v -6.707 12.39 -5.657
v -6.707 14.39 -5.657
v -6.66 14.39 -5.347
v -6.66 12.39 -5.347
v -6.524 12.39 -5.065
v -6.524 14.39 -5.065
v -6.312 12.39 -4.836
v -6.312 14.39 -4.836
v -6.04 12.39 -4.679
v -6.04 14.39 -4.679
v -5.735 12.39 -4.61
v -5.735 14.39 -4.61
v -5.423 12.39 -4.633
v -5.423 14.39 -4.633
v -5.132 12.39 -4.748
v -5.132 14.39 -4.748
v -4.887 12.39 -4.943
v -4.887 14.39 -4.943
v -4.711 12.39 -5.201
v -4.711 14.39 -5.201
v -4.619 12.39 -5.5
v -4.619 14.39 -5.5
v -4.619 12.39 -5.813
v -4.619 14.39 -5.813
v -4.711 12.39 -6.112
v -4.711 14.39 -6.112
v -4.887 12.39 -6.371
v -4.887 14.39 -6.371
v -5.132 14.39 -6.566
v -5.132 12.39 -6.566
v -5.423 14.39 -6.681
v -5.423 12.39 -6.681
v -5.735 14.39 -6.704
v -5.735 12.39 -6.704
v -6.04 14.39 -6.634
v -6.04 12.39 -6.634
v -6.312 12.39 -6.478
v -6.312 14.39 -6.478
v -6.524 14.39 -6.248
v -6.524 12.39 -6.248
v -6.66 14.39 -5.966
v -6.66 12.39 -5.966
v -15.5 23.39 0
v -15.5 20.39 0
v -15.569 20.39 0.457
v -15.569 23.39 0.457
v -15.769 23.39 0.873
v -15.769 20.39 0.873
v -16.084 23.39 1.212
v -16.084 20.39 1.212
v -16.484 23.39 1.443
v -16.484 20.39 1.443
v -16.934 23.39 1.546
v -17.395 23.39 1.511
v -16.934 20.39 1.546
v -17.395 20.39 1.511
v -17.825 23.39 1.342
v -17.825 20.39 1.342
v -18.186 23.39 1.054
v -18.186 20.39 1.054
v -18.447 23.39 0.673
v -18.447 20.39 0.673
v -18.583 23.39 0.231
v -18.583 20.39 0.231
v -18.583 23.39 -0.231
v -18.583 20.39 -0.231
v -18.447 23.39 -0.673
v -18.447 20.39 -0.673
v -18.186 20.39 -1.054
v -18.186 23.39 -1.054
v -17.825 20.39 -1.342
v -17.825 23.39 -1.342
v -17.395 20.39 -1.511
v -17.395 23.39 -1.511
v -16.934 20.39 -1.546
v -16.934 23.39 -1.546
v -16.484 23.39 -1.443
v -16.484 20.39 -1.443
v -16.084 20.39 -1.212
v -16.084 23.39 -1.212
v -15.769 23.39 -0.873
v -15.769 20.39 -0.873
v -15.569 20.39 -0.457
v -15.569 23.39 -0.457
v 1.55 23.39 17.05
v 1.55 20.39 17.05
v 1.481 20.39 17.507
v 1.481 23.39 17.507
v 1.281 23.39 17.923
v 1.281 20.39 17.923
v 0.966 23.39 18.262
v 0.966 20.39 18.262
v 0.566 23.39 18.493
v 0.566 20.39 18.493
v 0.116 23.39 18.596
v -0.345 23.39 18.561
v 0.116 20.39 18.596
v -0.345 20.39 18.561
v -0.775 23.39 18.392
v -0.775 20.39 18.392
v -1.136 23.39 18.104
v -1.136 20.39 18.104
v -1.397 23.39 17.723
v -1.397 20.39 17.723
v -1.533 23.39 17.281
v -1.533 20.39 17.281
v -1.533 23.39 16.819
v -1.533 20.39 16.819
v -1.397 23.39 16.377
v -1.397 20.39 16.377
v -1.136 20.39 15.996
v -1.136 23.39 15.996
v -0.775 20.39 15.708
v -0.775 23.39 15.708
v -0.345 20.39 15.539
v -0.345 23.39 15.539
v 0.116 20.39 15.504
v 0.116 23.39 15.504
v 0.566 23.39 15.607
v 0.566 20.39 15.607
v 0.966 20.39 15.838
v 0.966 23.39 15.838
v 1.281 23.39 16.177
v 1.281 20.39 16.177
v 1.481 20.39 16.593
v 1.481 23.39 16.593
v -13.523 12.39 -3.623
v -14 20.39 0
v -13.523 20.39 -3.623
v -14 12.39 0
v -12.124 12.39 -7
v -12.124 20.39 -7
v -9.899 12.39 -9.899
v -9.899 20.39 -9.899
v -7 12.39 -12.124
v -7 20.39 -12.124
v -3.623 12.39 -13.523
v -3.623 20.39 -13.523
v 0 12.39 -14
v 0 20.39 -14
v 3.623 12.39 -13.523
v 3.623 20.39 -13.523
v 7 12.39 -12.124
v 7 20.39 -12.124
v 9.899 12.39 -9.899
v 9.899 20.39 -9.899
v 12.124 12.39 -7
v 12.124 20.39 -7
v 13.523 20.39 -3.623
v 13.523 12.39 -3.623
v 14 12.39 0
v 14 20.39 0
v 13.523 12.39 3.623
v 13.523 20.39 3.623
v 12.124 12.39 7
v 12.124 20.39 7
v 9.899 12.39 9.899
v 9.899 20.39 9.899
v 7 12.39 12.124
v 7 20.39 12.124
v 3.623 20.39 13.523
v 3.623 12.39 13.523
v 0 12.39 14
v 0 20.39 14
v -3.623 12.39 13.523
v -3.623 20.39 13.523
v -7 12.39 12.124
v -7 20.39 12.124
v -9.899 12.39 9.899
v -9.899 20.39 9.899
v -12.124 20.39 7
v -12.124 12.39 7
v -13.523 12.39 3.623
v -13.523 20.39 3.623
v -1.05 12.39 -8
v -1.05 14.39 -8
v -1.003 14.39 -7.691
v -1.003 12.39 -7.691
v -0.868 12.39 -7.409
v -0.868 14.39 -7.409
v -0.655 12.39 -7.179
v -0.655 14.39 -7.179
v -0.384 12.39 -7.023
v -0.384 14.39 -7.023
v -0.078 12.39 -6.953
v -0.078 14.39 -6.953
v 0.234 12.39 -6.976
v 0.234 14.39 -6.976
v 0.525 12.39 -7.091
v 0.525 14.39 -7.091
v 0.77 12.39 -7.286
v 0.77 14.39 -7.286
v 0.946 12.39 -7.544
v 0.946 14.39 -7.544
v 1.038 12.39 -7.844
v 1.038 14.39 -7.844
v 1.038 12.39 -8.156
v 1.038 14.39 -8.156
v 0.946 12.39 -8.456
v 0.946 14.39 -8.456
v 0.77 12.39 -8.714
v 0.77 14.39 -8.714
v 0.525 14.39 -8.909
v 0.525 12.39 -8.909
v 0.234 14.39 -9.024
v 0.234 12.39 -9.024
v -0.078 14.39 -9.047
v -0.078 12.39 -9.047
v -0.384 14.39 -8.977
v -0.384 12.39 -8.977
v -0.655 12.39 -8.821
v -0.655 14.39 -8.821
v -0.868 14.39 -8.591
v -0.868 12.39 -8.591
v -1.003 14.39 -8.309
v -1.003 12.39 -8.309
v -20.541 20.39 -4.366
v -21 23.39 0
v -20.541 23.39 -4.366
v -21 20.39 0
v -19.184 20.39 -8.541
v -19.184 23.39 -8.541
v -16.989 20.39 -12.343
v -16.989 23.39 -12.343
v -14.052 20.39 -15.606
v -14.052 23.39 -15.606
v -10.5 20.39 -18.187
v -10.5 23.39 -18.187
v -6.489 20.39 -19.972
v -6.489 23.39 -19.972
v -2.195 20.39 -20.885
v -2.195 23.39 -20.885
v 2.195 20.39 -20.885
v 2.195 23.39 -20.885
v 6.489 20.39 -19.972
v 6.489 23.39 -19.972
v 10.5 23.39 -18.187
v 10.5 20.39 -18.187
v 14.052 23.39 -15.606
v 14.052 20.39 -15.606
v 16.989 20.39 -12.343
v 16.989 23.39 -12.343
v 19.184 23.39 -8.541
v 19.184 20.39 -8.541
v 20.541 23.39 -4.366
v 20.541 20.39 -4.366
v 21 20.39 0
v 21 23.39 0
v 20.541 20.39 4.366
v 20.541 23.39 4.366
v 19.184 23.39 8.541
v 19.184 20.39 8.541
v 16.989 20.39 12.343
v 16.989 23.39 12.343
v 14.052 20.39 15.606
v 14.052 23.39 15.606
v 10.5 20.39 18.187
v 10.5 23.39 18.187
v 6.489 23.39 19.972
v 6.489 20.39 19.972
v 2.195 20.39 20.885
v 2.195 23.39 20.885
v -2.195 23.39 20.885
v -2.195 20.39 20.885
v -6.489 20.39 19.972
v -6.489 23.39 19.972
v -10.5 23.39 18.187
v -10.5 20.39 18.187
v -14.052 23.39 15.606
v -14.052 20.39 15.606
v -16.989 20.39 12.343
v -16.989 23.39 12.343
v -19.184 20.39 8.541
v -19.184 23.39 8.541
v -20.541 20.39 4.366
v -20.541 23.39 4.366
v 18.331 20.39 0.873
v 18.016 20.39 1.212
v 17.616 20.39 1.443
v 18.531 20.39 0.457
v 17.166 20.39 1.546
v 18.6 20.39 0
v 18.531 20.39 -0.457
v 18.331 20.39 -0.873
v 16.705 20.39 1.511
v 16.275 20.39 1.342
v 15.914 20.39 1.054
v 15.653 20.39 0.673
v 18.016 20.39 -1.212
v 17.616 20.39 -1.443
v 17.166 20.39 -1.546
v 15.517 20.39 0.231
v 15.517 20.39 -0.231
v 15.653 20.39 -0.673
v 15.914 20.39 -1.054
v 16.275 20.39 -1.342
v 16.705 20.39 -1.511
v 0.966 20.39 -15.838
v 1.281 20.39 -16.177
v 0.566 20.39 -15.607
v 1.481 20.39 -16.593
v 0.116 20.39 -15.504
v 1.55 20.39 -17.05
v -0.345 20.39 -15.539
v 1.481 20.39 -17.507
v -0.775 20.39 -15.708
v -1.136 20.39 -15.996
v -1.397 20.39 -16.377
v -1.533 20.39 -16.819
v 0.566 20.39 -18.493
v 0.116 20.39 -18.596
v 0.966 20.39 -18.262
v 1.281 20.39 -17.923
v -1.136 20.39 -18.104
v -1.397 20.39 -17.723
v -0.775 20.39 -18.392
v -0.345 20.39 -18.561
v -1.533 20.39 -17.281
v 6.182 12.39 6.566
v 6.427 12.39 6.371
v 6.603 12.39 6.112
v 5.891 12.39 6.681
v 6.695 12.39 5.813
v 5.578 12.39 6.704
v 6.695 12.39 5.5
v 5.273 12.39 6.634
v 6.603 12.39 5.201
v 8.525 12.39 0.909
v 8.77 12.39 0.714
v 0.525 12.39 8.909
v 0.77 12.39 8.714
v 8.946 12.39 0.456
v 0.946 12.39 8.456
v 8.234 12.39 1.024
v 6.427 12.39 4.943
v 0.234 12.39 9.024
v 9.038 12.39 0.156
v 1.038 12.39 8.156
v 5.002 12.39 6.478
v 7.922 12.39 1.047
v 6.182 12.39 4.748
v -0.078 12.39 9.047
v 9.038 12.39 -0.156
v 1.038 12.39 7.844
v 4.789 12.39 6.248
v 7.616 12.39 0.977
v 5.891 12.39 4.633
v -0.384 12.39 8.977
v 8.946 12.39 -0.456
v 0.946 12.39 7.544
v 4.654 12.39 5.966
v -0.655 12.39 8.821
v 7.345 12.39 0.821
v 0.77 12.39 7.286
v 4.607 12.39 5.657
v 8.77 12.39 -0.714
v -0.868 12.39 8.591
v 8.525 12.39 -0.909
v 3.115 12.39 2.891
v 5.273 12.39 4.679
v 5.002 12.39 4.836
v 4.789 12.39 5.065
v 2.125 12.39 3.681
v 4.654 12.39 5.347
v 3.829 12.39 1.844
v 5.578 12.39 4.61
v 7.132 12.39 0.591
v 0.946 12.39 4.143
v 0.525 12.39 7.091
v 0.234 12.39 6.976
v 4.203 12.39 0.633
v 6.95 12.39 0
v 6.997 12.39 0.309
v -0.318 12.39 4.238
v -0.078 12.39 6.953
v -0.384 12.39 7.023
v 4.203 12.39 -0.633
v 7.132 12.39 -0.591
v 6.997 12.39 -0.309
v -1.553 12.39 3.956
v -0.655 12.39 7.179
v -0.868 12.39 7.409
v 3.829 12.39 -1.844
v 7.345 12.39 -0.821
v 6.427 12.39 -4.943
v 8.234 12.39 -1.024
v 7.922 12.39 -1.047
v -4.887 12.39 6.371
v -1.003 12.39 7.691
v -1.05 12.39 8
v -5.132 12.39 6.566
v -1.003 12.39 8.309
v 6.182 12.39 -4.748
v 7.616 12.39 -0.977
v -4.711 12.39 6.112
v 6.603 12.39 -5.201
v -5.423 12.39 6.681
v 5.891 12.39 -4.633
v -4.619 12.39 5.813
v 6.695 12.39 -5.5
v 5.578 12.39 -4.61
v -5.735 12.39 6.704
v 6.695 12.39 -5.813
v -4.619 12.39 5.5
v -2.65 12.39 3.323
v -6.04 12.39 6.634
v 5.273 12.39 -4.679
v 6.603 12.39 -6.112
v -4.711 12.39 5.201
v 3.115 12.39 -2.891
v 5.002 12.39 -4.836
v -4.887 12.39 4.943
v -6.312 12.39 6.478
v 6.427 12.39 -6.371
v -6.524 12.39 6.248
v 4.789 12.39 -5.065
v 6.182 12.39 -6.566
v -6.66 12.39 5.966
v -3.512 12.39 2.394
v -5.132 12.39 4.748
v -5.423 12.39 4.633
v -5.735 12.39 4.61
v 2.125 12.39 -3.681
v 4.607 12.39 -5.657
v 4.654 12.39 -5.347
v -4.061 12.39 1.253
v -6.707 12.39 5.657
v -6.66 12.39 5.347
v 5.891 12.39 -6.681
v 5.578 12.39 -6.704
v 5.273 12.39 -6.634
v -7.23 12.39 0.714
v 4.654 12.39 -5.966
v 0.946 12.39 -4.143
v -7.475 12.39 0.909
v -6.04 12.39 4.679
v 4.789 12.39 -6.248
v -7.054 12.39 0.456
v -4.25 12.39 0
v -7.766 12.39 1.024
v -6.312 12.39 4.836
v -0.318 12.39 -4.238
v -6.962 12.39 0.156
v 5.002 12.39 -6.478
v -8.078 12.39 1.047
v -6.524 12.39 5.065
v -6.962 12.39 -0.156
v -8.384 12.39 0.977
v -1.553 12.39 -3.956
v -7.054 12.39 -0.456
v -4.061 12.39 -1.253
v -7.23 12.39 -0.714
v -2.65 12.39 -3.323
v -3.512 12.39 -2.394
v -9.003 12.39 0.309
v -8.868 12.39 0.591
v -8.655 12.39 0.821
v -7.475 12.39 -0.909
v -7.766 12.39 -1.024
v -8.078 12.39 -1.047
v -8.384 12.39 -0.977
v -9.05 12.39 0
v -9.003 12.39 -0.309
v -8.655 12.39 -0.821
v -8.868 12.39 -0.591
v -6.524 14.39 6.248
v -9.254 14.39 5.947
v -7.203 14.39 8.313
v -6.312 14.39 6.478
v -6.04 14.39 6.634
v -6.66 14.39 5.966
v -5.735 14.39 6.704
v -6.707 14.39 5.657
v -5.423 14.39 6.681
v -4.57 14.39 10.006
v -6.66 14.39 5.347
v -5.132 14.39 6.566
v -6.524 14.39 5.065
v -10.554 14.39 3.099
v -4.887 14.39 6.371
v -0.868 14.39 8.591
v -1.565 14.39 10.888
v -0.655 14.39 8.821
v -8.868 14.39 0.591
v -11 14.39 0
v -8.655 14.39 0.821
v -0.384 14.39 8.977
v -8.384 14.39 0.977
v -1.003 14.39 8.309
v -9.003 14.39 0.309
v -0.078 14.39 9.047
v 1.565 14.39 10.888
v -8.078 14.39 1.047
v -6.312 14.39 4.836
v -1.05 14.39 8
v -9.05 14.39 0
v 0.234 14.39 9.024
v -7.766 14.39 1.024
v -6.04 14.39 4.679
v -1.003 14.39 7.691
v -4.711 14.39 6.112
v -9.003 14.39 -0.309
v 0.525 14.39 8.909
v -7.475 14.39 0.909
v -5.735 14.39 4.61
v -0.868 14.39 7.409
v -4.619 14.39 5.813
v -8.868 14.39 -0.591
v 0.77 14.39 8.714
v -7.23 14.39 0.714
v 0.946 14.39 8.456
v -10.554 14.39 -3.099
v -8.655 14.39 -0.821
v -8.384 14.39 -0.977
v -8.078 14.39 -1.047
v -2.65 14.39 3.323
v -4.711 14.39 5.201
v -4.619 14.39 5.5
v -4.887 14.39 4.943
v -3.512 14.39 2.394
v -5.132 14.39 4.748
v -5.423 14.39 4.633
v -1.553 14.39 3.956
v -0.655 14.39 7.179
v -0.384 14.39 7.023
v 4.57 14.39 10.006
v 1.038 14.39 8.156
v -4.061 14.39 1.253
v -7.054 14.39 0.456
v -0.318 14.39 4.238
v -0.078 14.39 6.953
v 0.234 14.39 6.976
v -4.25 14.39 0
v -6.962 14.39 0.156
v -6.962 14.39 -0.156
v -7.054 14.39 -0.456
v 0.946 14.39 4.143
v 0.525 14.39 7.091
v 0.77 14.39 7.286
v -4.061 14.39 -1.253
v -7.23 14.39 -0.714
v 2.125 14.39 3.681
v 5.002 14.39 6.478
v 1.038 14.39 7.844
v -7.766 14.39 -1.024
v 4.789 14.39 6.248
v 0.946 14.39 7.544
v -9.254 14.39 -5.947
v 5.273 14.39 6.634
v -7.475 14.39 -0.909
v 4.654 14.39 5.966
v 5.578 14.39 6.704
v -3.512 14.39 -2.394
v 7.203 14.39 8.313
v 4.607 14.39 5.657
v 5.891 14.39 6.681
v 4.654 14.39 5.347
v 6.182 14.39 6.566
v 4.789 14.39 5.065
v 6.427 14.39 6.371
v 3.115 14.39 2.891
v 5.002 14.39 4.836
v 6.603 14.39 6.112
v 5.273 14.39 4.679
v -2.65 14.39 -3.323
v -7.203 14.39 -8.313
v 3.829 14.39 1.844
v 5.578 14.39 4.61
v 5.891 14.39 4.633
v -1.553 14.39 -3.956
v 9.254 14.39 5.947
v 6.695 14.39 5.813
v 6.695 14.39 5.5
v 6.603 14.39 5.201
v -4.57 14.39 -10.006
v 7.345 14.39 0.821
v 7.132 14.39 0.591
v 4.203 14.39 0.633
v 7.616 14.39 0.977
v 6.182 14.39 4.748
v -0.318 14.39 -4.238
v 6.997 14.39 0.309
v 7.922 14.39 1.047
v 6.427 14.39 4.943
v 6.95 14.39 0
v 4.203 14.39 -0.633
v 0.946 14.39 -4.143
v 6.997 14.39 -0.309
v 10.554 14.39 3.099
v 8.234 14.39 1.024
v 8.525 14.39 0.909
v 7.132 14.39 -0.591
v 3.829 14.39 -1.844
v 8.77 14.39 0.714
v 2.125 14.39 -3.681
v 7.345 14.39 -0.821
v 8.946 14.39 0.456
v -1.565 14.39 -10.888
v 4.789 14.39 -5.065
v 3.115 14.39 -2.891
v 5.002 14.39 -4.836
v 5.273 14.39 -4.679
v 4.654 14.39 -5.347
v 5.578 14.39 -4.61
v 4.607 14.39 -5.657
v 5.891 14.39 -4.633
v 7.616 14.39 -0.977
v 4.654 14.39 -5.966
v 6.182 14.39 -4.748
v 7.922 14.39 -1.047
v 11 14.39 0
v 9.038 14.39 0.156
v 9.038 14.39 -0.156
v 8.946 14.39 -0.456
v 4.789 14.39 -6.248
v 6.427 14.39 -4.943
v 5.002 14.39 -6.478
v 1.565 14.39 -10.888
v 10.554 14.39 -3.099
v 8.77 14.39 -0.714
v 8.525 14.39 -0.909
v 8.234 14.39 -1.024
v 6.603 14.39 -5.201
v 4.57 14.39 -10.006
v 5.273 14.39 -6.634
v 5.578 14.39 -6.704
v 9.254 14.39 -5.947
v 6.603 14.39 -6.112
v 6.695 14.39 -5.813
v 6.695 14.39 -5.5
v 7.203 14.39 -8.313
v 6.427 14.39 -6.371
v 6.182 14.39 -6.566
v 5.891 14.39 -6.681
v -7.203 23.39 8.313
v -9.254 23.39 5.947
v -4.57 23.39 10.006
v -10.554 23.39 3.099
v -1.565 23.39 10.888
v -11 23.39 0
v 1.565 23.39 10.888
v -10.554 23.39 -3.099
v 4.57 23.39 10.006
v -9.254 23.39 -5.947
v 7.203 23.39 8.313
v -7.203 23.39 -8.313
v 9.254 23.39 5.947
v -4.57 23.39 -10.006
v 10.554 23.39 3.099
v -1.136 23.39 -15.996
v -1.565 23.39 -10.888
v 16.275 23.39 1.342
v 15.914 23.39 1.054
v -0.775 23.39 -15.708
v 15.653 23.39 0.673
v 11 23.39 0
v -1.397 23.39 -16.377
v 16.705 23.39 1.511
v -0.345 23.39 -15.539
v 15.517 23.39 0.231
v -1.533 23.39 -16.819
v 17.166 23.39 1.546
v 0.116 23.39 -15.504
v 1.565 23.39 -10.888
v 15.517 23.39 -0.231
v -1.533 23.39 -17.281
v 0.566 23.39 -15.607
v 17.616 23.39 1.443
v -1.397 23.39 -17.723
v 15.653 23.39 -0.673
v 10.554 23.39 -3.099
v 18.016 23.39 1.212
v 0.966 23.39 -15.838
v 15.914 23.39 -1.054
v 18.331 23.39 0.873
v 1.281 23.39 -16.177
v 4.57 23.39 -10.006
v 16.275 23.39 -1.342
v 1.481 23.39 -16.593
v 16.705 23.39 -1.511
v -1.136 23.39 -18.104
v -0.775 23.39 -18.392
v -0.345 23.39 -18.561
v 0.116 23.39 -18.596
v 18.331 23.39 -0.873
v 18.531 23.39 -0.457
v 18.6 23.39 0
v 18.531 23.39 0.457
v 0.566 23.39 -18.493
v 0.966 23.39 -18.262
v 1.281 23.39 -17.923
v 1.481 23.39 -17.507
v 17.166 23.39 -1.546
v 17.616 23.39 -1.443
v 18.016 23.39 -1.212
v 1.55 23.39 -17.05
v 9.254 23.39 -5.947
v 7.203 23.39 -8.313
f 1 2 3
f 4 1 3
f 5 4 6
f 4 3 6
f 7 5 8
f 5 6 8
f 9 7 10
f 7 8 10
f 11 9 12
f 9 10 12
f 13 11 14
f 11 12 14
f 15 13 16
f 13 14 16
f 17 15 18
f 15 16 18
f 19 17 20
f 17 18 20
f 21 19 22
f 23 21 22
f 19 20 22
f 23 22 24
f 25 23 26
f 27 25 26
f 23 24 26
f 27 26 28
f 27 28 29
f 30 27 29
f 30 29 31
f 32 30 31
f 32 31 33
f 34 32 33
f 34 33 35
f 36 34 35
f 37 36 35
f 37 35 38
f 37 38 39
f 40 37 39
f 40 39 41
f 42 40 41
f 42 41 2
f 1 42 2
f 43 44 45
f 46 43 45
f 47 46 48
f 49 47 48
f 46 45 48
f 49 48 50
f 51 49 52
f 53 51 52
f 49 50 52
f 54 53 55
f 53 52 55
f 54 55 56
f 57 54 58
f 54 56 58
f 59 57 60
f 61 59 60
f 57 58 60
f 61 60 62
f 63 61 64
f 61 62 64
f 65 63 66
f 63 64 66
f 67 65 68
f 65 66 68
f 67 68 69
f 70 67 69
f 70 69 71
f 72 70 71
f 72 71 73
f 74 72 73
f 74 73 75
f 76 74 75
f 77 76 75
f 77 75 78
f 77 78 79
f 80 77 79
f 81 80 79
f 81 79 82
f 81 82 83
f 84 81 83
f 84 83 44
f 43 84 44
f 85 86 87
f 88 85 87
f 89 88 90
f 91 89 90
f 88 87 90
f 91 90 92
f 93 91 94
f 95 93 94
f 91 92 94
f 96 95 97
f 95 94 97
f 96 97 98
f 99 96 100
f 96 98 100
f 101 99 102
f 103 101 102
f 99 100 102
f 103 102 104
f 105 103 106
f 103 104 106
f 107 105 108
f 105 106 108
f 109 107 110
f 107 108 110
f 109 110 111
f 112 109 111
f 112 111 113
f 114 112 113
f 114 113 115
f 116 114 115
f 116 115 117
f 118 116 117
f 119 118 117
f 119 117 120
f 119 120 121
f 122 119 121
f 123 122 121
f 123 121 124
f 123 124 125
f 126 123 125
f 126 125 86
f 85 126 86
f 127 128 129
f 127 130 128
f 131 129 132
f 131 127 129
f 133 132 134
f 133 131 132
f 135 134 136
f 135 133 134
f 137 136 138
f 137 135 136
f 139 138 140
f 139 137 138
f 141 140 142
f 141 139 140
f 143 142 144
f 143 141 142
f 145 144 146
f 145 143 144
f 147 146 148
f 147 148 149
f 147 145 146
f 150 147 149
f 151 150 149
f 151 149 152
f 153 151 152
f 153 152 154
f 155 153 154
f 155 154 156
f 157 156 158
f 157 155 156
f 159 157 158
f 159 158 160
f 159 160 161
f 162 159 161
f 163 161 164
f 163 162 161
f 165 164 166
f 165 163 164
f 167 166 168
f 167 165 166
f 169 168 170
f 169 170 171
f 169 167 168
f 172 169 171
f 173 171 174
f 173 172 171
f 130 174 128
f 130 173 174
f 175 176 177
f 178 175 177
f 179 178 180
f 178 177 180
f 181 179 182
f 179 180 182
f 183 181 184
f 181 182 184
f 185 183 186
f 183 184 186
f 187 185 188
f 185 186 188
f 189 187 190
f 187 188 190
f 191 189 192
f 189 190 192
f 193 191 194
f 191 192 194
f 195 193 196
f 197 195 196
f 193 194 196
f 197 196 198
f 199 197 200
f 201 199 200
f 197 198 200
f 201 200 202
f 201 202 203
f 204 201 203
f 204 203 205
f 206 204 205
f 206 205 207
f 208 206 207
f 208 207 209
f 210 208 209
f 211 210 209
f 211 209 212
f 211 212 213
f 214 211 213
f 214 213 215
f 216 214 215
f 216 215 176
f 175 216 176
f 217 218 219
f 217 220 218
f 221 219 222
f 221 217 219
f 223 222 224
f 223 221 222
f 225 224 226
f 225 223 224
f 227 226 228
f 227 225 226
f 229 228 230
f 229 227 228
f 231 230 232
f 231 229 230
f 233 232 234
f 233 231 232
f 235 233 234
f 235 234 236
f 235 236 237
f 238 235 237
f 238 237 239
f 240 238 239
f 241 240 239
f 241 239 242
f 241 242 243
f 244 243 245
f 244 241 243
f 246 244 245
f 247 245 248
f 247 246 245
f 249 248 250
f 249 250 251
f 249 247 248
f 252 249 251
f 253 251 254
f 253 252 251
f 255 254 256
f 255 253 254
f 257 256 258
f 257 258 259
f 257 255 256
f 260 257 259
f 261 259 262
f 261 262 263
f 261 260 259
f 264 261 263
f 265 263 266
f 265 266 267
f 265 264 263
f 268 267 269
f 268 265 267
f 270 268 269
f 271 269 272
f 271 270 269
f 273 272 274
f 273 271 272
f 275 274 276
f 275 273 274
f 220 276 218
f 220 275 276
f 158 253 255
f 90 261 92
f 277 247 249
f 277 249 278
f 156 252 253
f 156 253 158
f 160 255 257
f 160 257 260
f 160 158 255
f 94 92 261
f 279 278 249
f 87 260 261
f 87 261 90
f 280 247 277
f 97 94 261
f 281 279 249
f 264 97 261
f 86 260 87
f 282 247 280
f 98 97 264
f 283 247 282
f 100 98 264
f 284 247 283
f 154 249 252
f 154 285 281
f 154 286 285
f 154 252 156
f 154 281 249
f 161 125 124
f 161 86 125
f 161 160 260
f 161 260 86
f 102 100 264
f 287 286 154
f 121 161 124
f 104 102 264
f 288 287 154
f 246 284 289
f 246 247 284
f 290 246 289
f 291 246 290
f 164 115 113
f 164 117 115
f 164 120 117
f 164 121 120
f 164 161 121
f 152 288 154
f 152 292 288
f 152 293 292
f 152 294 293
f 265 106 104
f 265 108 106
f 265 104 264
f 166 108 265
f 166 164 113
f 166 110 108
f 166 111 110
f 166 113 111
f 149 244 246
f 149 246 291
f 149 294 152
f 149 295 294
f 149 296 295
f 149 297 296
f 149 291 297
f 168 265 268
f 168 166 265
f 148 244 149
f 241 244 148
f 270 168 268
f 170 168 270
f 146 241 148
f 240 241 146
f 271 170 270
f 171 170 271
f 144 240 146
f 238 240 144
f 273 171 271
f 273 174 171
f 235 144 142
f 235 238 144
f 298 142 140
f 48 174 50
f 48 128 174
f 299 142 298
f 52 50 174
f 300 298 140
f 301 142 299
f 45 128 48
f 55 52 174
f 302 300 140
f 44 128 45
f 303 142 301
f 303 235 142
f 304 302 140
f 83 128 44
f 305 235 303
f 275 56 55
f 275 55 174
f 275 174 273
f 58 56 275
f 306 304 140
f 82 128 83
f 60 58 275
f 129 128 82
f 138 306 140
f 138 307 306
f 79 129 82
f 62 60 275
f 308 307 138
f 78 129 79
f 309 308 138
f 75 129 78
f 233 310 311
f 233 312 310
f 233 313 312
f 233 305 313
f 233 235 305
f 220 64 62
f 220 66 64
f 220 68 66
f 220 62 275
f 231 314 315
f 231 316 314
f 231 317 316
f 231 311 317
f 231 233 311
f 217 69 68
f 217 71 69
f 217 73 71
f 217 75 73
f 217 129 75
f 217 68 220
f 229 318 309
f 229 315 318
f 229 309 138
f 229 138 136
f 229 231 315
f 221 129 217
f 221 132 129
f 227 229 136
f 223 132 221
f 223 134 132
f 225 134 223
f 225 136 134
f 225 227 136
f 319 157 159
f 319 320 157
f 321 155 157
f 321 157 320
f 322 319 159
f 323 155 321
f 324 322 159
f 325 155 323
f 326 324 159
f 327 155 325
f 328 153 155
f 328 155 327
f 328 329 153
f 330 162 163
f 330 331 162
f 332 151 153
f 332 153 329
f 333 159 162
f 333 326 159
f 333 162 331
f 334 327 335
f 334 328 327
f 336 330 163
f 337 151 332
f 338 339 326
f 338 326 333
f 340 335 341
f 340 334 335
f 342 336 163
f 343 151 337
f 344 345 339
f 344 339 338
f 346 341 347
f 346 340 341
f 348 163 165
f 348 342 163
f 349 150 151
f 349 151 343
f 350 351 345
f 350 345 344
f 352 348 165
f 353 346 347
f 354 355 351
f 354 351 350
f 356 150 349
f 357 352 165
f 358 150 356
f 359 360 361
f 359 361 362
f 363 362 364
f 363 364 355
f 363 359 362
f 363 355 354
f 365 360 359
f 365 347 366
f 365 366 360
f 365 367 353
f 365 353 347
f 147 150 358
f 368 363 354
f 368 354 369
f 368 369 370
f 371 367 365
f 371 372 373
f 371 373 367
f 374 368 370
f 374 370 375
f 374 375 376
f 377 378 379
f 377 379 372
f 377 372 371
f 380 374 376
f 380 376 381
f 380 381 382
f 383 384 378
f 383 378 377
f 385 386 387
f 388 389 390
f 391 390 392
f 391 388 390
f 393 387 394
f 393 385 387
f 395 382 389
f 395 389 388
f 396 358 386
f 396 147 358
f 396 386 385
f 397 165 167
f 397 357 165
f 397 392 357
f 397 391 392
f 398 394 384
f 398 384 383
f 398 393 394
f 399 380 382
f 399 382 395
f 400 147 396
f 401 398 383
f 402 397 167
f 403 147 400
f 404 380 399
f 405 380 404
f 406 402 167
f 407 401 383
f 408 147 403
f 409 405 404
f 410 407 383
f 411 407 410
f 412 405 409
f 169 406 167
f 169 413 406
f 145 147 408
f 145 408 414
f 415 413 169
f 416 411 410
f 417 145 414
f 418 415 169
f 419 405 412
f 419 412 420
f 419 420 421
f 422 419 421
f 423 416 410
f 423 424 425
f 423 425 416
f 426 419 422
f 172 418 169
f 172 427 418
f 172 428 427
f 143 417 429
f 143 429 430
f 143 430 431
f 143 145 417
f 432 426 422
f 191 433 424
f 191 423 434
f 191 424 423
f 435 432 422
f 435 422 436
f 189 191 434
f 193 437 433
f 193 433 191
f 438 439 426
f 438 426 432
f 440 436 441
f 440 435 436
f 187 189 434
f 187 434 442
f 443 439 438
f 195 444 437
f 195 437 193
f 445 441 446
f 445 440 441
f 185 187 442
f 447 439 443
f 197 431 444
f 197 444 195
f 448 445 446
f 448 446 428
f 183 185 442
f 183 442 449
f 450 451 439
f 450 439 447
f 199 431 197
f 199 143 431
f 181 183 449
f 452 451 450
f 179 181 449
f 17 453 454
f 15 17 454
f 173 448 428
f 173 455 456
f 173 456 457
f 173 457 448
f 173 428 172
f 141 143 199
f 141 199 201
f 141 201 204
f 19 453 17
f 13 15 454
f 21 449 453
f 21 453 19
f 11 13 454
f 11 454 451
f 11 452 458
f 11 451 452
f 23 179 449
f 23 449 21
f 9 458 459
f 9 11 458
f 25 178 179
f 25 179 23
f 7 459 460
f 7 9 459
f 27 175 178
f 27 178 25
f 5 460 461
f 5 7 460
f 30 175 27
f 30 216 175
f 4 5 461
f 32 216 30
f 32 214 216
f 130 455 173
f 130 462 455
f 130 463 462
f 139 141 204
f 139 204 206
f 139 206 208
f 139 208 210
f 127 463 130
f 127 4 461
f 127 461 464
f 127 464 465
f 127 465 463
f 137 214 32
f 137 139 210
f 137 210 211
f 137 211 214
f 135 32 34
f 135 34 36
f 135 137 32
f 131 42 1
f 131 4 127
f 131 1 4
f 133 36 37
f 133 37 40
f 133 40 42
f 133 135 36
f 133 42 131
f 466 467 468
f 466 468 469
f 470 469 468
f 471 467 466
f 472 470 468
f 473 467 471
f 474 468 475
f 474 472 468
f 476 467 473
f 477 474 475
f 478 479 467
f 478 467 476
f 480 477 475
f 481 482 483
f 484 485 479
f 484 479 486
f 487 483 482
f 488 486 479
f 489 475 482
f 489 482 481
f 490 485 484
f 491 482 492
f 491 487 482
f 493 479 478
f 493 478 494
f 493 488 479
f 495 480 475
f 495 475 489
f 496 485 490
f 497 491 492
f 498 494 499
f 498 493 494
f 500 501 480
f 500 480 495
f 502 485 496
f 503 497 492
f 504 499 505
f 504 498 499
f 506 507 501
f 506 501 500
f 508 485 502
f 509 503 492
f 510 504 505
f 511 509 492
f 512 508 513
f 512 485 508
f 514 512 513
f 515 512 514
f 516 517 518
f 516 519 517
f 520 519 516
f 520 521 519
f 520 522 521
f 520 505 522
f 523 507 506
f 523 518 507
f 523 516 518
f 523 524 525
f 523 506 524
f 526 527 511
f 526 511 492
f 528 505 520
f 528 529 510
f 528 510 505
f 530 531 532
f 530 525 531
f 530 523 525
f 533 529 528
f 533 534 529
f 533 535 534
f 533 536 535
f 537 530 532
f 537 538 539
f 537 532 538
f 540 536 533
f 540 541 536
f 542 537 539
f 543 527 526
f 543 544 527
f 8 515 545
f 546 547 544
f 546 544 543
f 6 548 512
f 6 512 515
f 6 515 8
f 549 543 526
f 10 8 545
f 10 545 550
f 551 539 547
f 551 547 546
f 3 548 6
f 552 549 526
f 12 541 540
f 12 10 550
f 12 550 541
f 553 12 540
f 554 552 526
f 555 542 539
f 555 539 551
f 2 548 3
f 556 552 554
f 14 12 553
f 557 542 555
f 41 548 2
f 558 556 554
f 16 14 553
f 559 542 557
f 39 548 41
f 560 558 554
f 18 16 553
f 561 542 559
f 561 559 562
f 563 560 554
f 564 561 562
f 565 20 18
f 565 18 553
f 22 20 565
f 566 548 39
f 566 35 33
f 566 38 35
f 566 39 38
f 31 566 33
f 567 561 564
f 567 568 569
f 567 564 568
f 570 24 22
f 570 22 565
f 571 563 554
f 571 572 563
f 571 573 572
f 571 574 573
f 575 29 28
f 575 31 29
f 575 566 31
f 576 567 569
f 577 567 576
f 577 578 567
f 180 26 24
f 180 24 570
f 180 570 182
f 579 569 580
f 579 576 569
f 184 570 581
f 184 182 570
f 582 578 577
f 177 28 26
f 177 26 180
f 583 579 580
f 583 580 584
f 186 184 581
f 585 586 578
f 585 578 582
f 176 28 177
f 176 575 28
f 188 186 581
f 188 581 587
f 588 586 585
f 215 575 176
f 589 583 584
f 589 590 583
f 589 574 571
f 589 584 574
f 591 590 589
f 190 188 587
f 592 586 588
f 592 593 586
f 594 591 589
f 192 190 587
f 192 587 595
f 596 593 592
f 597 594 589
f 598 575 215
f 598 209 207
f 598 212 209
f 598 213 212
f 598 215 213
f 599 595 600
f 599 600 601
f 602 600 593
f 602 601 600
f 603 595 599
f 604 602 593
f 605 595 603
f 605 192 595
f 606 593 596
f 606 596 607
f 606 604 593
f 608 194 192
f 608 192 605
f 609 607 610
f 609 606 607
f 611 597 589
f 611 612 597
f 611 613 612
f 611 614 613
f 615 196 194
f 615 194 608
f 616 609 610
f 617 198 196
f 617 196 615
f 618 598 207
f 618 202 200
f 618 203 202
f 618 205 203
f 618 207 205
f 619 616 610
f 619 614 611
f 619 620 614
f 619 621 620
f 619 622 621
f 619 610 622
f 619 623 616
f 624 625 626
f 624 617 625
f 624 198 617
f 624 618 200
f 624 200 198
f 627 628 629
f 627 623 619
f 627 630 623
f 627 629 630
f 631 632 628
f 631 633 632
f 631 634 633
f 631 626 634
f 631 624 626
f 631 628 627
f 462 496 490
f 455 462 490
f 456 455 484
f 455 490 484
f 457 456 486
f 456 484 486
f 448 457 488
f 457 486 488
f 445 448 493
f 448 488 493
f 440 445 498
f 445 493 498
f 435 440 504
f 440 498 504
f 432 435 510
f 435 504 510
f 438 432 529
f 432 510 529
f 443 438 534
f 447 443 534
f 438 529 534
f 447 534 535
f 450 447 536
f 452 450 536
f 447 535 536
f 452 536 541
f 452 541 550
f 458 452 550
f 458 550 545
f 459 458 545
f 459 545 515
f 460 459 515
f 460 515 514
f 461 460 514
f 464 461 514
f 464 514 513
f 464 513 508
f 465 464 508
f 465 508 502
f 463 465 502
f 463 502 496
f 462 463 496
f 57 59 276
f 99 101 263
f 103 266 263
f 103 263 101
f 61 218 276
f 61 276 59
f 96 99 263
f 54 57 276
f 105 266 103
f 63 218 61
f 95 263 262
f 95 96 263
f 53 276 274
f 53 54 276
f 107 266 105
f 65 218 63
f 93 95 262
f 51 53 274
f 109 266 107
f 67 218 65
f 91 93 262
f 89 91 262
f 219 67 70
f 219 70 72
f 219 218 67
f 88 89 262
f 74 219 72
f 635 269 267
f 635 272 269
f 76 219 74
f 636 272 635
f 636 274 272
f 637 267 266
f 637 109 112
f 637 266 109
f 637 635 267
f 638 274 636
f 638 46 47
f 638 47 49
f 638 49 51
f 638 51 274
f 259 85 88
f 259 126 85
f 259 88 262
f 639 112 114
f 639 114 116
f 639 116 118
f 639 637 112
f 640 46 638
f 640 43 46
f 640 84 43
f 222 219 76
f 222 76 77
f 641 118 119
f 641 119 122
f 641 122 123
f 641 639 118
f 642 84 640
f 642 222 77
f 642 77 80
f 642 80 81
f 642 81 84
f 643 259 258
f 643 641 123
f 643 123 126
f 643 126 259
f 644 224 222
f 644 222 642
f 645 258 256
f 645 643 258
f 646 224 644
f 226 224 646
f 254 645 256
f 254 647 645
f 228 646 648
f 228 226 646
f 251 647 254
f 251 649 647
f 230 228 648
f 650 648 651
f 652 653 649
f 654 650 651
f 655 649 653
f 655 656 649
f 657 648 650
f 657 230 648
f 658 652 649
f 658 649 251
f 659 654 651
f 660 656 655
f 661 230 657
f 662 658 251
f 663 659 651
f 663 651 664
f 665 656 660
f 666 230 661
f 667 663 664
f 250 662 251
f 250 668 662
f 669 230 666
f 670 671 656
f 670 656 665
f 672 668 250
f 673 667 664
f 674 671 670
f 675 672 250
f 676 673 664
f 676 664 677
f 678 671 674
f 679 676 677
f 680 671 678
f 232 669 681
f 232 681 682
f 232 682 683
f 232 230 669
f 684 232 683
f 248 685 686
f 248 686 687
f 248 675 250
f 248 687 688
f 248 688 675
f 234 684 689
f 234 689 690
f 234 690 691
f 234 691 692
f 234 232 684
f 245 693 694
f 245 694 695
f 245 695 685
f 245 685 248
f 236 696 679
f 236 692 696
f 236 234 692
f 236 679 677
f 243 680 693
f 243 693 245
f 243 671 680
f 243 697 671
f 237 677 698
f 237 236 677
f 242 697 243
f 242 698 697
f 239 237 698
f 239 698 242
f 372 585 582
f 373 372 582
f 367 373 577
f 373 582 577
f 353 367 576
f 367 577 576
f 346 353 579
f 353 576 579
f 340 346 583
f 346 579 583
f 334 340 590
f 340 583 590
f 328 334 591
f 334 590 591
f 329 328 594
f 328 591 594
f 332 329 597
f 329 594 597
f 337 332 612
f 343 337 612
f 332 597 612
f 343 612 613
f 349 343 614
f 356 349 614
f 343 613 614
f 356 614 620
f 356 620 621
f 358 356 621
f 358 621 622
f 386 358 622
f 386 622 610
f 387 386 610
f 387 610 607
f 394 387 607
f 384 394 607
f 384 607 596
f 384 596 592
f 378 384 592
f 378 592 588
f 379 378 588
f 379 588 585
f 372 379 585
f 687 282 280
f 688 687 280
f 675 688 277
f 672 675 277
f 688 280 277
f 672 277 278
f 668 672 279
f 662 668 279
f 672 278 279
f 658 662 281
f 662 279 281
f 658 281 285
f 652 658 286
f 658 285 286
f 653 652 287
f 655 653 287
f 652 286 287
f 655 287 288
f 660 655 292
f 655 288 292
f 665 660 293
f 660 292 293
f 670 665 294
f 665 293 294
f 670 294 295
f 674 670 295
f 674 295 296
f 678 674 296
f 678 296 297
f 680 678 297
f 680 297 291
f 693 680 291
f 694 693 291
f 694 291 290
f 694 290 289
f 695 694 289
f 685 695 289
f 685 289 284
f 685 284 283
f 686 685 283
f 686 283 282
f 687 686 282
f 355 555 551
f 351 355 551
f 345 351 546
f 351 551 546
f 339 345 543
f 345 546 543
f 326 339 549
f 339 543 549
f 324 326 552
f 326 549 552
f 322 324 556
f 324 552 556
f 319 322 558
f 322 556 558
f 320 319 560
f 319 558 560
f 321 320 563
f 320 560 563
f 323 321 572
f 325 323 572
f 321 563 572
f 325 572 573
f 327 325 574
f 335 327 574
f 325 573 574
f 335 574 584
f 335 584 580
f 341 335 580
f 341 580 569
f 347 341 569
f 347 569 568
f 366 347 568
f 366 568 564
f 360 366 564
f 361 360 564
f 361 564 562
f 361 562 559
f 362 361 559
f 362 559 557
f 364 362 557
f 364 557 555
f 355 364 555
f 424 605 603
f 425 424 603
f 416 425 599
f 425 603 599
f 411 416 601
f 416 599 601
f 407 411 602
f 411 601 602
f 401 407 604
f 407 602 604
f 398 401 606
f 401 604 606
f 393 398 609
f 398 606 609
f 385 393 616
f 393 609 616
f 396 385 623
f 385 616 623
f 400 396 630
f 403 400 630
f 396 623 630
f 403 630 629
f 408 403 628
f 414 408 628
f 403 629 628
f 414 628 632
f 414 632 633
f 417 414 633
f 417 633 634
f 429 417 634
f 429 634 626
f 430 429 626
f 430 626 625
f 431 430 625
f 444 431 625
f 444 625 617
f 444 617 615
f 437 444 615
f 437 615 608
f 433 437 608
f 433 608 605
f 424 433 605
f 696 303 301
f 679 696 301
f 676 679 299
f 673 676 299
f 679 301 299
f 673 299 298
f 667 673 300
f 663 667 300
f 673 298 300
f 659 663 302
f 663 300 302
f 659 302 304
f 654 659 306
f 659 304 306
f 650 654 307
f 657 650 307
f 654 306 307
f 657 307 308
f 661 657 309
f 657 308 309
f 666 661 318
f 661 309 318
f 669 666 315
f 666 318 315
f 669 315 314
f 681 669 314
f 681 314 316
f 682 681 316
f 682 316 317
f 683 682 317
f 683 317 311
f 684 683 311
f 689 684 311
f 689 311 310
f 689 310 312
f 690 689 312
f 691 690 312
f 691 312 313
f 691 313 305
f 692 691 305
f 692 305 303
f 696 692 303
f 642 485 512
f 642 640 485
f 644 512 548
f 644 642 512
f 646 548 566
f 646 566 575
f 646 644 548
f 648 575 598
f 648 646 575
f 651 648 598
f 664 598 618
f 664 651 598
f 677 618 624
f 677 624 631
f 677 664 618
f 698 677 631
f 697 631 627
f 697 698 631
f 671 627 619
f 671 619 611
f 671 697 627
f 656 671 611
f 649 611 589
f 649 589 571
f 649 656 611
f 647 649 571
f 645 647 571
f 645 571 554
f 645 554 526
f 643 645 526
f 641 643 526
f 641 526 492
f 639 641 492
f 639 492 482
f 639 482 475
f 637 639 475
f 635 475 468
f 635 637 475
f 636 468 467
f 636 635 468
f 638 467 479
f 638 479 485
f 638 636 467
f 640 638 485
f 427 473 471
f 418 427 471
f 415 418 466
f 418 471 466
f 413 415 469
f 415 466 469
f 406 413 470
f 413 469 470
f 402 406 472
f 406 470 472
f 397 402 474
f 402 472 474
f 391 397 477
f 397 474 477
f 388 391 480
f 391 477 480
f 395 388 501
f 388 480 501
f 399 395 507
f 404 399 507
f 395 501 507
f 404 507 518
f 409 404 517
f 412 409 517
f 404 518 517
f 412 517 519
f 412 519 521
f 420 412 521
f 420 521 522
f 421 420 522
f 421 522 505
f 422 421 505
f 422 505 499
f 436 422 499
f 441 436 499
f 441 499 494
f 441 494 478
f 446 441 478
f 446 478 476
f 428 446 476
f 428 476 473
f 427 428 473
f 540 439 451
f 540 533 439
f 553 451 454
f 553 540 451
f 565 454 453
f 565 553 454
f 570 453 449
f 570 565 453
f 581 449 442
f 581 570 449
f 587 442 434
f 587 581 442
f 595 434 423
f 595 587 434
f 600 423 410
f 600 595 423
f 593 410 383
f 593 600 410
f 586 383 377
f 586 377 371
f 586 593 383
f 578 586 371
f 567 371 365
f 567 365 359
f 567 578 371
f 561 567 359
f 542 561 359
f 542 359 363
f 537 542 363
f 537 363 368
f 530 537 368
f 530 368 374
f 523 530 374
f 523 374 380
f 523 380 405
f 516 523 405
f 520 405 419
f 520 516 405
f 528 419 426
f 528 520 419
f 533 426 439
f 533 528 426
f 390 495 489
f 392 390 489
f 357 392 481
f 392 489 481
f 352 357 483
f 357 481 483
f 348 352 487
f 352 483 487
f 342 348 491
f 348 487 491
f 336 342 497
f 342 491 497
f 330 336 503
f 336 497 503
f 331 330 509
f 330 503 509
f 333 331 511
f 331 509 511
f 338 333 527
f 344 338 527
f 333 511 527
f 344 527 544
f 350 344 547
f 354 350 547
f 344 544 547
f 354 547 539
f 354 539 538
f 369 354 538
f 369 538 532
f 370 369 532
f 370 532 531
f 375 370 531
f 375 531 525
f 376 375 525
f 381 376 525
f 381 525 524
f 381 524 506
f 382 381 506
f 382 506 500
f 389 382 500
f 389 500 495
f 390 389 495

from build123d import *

# Parameters (mm, degrees)
ESQUISSE4_R             = 1.05
ENL_V_MAT_EXTRU_1_DEPTH = 32.032241298
ESQUISSE5_R             = 1.55
ENL_V_MAT_EXTRU_2_DEPTH = 31.757112998


with BuildPart() as part:
    # Esquisse3 → Révolution2 (revolve)
    with BuildSketch(Plane.XY):
        Polygon((-21, 23.3897956), (-21, 20.3897956), (-14, 20.3897956), (-14, 12.3897956), (-4.25, 12.3897956), (-4.25, 14.3897956), (-11, 14.3897956), (-11, 23.3897956), align=None)
    revolve(axis=Axis((0, 36.82979074, 0), (0, -1, 0)))

    # Esquisse4 → Enlèv. mat.-Extru.1 (cut, through all)
    with BuildSketch(Plane(origin=(0, 14.3897956, 0), x_dir=(1, 0, 0), z_dir=(0, 1, 0))):
        with Locations(Location((0, 8, 0), (0, 0, 180))):
            Circle(ESQUISSE4_R)
        with Locations(Location((5.656854249, 5.656854249, 0), (0, 0, 180))):
            Circle(ESQUISSE4_R)
        with Locations(Location((8, 0, 0), (0, 0, 180))):
            Circle(ESQUISSE4_R)
        with Locations(Location((5.656854249, -5.656854249, 0), (0, 0, 180))):
            Circle(ESQUISSE4_R)
        with Locations(Location((0, -8, 0), (0, 0, 180))):
            Circle(ESQUISSE4_R)
        with Locations(Location((-5.656854249, -5.656854249, 0), (0, 0, 180))):
            Circle(ESQUISSE4_R)
        with Locations(Location((-8, 0, 0), (0, 0, 180))):
            Circle(ESQUISSE4_R)
        with Locations(Location((-5.656854249, 5.656854249, 0), (0, 0, 180))):
            Circle(ESQUISSE4_R)
    extrude(amount=-ENL_V_MAT_EXTRU_1_DEPTH, mode=Mode.SUBTRACT)

    # Esquisse5 → Enlèv. mat.-Extru.2 (cut, through all)
    with BuildSketch(Plane.XZ.offset(-20.3897956)):
        with Locations((0, 17.05)):
            Circle(ESQUISSE5_R)
        with Locations((17.05, 0)):
            Circle(ESQUISSE5_R)
        with Locations((0, -17.05)):
            Circle(ESQUISSE5_R)
        with Locations((-17.05, 0)):
            Circle(ESQUISSE5_R)
    extrude(amount=-ENL_V_MAT_EXTRU_2_DEPTH, mode=Mode.SUBTRACT)


solid = part.part
